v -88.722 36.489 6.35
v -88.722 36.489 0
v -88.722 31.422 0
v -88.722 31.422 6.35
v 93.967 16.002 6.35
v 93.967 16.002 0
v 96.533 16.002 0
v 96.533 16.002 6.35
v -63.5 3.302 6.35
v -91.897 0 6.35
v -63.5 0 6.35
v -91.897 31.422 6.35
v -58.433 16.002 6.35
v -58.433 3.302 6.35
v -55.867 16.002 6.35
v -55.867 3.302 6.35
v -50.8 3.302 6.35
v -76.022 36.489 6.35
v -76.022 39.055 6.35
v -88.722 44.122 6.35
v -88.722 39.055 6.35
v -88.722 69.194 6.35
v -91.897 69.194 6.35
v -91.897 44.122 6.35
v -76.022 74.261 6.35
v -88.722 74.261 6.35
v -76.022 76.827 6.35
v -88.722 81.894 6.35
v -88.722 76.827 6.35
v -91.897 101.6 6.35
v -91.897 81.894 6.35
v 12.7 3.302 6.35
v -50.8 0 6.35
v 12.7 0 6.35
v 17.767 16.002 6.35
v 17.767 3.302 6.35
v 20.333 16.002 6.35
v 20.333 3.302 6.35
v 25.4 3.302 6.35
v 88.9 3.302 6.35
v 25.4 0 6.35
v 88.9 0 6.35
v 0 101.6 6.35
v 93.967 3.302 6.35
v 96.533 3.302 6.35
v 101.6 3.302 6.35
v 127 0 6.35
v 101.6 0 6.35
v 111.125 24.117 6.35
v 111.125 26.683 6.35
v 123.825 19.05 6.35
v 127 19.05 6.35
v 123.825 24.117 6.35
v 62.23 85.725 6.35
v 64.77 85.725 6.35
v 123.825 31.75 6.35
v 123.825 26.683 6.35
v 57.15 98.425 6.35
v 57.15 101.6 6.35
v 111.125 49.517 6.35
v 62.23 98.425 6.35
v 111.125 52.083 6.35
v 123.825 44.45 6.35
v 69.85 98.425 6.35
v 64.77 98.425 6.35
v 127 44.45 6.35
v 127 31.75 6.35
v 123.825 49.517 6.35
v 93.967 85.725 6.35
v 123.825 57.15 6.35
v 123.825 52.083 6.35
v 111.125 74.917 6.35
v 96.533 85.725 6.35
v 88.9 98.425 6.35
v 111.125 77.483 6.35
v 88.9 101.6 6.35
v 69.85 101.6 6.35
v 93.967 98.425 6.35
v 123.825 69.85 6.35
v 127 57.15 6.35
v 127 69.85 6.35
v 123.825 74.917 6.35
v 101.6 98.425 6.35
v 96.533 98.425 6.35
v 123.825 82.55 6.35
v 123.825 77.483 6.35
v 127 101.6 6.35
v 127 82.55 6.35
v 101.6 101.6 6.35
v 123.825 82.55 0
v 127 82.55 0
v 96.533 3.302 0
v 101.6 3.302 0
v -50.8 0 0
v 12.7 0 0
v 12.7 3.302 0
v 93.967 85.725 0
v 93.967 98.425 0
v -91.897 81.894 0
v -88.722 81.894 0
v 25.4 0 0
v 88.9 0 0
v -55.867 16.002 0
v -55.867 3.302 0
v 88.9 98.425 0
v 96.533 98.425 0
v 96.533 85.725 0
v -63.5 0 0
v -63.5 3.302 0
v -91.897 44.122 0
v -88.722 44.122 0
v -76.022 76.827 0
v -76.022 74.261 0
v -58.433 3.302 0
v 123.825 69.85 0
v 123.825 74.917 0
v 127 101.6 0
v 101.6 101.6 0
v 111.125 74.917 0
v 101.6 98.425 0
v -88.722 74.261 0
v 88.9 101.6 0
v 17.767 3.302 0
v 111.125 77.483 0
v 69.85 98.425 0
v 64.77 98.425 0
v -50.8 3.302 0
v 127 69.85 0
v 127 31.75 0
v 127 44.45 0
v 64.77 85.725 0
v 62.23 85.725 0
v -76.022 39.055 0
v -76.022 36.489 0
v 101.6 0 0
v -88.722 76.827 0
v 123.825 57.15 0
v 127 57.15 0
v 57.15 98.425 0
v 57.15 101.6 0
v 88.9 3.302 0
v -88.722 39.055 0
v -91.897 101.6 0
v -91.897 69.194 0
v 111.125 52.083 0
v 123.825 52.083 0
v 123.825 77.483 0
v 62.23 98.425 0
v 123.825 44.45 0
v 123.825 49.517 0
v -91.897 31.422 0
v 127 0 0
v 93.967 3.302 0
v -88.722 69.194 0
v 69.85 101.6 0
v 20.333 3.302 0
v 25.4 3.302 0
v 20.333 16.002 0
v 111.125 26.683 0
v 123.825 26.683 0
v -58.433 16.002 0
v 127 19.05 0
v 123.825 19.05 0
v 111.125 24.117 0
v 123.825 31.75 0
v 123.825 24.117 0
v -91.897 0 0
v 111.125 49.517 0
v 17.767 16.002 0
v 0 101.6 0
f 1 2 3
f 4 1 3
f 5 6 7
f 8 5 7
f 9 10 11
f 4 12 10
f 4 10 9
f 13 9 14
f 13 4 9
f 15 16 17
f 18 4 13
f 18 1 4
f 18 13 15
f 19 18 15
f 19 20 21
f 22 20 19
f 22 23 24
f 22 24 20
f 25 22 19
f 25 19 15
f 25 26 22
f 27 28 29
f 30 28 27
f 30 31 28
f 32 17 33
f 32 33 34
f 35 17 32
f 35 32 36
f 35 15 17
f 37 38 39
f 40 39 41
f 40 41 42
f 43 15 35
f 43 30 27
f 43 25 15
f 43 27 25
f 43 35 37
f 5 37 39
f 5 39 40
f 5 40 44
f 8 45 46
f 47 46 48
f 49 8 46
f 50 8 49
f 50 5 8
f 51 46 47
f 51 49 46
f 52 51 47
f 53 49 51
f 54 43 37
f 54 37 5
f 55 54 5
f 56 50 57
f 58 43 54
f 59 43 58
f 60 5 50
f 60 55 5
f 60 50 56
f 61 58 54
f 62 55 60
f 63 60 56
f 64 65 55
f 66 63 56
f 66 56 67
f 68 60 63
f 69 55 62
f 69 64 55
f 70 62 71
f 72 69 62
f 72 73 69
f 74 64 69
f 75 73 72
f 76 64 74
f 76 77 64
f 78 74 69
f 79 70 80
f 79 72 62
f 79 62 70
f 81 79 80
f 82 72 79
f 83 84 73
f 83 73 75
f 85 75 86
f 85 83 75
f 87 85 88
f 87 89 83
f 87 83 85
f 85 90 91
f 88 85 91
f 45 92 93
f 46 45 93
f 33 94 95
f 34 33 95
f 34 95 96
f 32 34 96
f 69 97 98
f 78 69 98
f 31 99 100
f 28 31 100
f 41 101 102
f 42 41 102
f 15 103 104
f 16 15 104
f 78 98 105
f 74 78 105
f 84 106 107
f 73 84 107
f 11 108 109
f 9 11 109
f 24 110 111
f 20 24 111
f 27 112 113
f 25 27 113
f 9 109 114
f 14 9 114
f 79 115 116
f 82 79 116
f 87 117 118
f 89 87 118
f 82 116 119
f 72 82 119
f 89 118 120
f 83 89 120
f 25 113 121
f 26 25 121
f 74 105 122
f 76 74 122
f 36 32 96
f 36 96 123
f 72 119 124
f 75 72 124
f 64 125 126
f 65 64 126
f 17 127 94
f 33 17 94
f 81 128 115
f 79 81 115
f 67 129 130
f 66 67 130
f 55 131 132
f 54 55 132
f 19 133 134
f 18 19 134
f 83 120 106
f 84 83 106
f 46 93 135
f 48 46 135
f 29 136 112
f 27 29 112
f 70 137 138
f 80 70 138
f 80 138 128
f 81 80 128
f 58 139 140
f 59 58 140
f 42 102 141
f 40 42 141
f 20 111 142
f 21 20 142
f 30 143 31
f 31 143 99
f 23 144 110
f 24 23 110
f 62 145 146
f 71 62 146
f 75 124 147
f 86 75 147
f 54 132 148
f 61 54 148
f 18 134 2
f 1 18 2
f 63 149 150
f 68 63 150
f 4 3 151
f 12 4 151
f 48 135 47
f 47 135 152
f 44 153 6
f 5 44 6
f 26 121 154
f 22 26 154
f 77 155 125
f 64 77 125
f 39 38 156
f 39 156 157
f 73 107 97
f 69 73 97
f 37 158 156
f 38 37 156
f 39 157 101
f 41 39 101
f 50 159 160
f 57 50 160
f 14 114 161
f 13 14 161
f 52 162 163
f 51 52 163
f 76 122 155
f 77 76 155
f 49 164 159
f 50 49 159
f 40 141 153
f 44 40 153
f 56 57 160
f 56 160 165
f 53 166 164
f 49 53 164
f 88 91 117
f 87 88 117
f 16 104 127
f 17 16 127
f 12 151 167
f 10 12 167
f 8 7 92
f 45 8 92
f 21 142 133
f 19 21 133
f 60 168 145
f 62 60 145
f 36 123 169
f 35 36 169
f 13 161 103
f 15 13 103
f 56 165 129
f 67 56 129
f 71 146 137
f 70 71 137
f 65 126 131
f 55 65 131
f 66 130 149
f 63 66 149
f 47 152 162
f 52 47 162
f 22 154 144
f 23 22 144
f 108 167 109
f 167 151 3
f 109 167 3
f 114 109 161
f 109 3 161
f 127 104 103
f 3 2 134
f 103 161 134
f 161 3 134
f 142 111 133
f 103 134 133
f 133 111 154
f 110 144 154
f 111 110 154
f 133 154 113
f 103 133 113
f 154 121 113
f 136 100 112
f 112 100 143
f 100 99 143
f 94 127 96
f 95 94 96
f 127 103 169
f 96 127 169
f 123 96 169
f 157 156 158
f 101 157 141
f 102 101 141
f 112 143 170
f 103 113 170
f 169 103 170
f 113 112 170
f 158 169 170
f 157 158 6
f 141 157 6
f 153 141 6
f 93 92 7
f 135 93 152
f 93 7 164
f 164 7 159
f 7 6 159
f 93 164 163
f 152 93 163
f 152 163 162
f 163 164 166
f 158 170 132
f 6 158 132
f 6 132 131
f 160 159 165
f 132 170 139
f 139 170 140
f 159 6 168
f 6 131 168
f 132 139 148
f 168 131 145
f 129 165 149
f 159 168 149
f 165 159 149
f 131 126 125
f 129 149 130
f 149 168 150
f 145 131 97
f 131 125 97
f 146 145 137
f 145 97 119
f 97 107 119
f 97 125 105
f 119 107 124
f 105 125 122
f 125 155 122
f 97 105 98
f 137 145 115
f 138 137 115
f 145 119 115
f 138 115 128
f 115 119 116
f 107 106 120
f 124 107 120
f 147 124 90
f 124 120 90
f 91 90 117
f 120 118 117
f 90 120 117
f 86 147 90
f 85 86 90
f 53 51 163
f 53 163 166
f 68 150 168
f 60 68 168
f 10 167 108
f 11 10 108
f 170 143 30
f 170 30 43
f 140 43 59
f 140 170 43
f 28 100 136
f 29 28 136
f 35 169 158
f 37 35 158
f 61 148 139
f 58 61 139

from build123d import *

# Parameters (mm, degrees)
BOSS_EXTRUDE1_DEPTH     = 6.35
CUT_EXTRUDE4_DEPTH      = 127
CUT_EXTRUDE4_DEPTH_BACK = 127
CUT_EXTRUDE5_DEPTH      = 127
CUT_EXTRUDE5_DEPTH_BACK = 127
CUT_EXTRUDE7_DEPTH      = 127
CUT_EXTRUDE7_DEPTH_BACK = 127
SKETCH5_W               = 229.808362084
SKETCH5_H               = 77.917038349


with BuildPart() as part:
    # Sketch1 → Boss-Extrude1 (new body)
    with BuildSketch(Plane.XY):
        Polygon((0, 0), (127, 0), (127, 101.6), (0, 101.6), (-70.692427737, 172.292427737), (-91.896861793, 151.087993682), (-91.896861793, 0), align=None)
    extrude(amount=BOSS_EXTRUDE1_DEPTH)

    # Sketch3 → Cut-Extrude4 (cut, two sides: drawn at the far end of the back side and taken through both)
    with BuildSketch(Plane(origin=(0, 0, 0), x_dir=(-1, 0, 0), z_dir=(0, 0, -1)).offset(-CUT_EXTRUDE4_DEPTH_BACK)):
        Polygon((68.447363707, 161.067107586), (63.957235647, 156.576979525), (66.202299677, 154.331915495), (70.692427737, 158.822043556), align=None)
        Polygon((-127, 31.75), (-127, 19.05), (-123.825, 19.05), (-123.825, 24.1173), (-111.125, 24.1173), (-111.125, 26.6827), (-123.825, 26.6827), (-123.825, 31.75), align=None)
        Polygon((-57.15, 101.6), (-69.85, 101.6), (-69.85, 98.425), (-64.77, 98.425), (-64.77, 85.725), (-62.23, 85.725), (-62.23, 98.425), (-57.15, 98.425), align=None)
        Polygon((-88.9, 101.6), (-101.6, 101.6), (-101.6, 98.425), (-96.5327, 98.425), (-96.5327, 85.725), (-93.9673, 85.725), (-93.9673, 98.425), (-88.9, 98.425), align=None)
        Polygon((-127, 82.55), (-127, 69.85), (-123.825, 69.85), (-123.825, 74.9173), (-111.125, 74.9173), (-111.125, 77.4827), (-123.825, 77.4827), (-123.825, 82.55), align=None)
        Polygon((-127, 57.15), (-127, 44.45), (-123.825, 44.45), (-123.825, 49.5173), (-111.125, 49.5173), (-111.125, 52.0827), (-123.825, 52.0827), (-123.825, 57.15), align=None)
        Polygon((88.721861793, 106.965995261), (91.896861793, 106.965995261), (91.896861793, 119.665995261), (88.721861793, 119.665995261), (88.721861793, 114.598695261), (76.021861793, 114.598695261), (76.021861793, 112.033295261), (88.721861793, 112.033295261), align=None)
        Polygon((88.721861793, 69.193996841), (91.896861793, 69.193996841), (91.896861793, 81.893996841), (88.721861793, 81.893996841), (88.721861793, 76.826696841), (76.021861793, 76.826696841), (76.021861793, 74.261296841), (88.721861793, 74.261296841), align=None)
        Polygon((88.721861793, 31.42199842), (91.896861793, 31.42199842), (91.896861793, 44.12199842), (88.721861793, 44.12199842), (88.721861793, 39.05469842), (76.021861793, 39.05469842), (76.021861793, 36.48929842), (88.721861793, 36.48929842), align=None)
        Polygon((50.8, 3.302), (50.8, 0), (63.5, 0), (63.5, 3.302), (58.4327, 3.302), (58.4327, 16.002), (55.8673, 16.002), (55.8673, 3.302), align=None)
        Polygon((-25.4, 3.302), (-25.4, 0), (-12.7, 0), (-12.7, 3.302), (-17.7673, 3.302), (-17.7673, 16.002), (-20.3327, 16.002), (-20.3327, 3.302), align=None)
        Polygon((-101.6, 3.302), (-101.6, 0), (-88.9, 0), (-88.9, 3.302), (-93.9673, 3.302), (-93.9673, 16.002), (-96.5327, 16.002), (-96.5327, 3.302), align=None)
    extrude(amount=CUT_EXTRUDE4_DEPTH + CUT_EXTRUDE4_DEPTH_BACK, mode=Mode.SUBTRACT)

    # Sketch4 → Cut-Extrude5 (cut, two sides: drawn at the far end of the back side and taken through both)
    with BuildSketch(Plane.XY.offset(-CUT_EXTRUDE5_DEPTH_BACK)):
        Polygon((-81.917747889, 147.596723404), (-79.672683858, 149.841787435), (-75.182555798, 145.351659374), (-77.427619828, 143.106595344), align=None)
    extrude(amount=CUT_EXTRUDE5_DEPTH + CUT_EXTRUDE5_DEPTH_BACK, mode=Mode.SUBTRACT)

    # Sketch5 → Cut-Extrude7 (cut, two sides: drawn at the far end of the back side and taken through both)
    with BuildSketch(Plane.XY.offset(-CUT_EXTRUDE7_DEPTH_BACK)):
        with Locations((12.095818958, 140.558519175)):
            Rectangle(SKETCH5_W, SKETCH5_H)
    extrude(amount=CUT_EXTRUDE7_DEPTH + CUT_EXTRUDE7_DEPTH_BACK, mode=Mode.SUBTRACT)


solid = part.part
